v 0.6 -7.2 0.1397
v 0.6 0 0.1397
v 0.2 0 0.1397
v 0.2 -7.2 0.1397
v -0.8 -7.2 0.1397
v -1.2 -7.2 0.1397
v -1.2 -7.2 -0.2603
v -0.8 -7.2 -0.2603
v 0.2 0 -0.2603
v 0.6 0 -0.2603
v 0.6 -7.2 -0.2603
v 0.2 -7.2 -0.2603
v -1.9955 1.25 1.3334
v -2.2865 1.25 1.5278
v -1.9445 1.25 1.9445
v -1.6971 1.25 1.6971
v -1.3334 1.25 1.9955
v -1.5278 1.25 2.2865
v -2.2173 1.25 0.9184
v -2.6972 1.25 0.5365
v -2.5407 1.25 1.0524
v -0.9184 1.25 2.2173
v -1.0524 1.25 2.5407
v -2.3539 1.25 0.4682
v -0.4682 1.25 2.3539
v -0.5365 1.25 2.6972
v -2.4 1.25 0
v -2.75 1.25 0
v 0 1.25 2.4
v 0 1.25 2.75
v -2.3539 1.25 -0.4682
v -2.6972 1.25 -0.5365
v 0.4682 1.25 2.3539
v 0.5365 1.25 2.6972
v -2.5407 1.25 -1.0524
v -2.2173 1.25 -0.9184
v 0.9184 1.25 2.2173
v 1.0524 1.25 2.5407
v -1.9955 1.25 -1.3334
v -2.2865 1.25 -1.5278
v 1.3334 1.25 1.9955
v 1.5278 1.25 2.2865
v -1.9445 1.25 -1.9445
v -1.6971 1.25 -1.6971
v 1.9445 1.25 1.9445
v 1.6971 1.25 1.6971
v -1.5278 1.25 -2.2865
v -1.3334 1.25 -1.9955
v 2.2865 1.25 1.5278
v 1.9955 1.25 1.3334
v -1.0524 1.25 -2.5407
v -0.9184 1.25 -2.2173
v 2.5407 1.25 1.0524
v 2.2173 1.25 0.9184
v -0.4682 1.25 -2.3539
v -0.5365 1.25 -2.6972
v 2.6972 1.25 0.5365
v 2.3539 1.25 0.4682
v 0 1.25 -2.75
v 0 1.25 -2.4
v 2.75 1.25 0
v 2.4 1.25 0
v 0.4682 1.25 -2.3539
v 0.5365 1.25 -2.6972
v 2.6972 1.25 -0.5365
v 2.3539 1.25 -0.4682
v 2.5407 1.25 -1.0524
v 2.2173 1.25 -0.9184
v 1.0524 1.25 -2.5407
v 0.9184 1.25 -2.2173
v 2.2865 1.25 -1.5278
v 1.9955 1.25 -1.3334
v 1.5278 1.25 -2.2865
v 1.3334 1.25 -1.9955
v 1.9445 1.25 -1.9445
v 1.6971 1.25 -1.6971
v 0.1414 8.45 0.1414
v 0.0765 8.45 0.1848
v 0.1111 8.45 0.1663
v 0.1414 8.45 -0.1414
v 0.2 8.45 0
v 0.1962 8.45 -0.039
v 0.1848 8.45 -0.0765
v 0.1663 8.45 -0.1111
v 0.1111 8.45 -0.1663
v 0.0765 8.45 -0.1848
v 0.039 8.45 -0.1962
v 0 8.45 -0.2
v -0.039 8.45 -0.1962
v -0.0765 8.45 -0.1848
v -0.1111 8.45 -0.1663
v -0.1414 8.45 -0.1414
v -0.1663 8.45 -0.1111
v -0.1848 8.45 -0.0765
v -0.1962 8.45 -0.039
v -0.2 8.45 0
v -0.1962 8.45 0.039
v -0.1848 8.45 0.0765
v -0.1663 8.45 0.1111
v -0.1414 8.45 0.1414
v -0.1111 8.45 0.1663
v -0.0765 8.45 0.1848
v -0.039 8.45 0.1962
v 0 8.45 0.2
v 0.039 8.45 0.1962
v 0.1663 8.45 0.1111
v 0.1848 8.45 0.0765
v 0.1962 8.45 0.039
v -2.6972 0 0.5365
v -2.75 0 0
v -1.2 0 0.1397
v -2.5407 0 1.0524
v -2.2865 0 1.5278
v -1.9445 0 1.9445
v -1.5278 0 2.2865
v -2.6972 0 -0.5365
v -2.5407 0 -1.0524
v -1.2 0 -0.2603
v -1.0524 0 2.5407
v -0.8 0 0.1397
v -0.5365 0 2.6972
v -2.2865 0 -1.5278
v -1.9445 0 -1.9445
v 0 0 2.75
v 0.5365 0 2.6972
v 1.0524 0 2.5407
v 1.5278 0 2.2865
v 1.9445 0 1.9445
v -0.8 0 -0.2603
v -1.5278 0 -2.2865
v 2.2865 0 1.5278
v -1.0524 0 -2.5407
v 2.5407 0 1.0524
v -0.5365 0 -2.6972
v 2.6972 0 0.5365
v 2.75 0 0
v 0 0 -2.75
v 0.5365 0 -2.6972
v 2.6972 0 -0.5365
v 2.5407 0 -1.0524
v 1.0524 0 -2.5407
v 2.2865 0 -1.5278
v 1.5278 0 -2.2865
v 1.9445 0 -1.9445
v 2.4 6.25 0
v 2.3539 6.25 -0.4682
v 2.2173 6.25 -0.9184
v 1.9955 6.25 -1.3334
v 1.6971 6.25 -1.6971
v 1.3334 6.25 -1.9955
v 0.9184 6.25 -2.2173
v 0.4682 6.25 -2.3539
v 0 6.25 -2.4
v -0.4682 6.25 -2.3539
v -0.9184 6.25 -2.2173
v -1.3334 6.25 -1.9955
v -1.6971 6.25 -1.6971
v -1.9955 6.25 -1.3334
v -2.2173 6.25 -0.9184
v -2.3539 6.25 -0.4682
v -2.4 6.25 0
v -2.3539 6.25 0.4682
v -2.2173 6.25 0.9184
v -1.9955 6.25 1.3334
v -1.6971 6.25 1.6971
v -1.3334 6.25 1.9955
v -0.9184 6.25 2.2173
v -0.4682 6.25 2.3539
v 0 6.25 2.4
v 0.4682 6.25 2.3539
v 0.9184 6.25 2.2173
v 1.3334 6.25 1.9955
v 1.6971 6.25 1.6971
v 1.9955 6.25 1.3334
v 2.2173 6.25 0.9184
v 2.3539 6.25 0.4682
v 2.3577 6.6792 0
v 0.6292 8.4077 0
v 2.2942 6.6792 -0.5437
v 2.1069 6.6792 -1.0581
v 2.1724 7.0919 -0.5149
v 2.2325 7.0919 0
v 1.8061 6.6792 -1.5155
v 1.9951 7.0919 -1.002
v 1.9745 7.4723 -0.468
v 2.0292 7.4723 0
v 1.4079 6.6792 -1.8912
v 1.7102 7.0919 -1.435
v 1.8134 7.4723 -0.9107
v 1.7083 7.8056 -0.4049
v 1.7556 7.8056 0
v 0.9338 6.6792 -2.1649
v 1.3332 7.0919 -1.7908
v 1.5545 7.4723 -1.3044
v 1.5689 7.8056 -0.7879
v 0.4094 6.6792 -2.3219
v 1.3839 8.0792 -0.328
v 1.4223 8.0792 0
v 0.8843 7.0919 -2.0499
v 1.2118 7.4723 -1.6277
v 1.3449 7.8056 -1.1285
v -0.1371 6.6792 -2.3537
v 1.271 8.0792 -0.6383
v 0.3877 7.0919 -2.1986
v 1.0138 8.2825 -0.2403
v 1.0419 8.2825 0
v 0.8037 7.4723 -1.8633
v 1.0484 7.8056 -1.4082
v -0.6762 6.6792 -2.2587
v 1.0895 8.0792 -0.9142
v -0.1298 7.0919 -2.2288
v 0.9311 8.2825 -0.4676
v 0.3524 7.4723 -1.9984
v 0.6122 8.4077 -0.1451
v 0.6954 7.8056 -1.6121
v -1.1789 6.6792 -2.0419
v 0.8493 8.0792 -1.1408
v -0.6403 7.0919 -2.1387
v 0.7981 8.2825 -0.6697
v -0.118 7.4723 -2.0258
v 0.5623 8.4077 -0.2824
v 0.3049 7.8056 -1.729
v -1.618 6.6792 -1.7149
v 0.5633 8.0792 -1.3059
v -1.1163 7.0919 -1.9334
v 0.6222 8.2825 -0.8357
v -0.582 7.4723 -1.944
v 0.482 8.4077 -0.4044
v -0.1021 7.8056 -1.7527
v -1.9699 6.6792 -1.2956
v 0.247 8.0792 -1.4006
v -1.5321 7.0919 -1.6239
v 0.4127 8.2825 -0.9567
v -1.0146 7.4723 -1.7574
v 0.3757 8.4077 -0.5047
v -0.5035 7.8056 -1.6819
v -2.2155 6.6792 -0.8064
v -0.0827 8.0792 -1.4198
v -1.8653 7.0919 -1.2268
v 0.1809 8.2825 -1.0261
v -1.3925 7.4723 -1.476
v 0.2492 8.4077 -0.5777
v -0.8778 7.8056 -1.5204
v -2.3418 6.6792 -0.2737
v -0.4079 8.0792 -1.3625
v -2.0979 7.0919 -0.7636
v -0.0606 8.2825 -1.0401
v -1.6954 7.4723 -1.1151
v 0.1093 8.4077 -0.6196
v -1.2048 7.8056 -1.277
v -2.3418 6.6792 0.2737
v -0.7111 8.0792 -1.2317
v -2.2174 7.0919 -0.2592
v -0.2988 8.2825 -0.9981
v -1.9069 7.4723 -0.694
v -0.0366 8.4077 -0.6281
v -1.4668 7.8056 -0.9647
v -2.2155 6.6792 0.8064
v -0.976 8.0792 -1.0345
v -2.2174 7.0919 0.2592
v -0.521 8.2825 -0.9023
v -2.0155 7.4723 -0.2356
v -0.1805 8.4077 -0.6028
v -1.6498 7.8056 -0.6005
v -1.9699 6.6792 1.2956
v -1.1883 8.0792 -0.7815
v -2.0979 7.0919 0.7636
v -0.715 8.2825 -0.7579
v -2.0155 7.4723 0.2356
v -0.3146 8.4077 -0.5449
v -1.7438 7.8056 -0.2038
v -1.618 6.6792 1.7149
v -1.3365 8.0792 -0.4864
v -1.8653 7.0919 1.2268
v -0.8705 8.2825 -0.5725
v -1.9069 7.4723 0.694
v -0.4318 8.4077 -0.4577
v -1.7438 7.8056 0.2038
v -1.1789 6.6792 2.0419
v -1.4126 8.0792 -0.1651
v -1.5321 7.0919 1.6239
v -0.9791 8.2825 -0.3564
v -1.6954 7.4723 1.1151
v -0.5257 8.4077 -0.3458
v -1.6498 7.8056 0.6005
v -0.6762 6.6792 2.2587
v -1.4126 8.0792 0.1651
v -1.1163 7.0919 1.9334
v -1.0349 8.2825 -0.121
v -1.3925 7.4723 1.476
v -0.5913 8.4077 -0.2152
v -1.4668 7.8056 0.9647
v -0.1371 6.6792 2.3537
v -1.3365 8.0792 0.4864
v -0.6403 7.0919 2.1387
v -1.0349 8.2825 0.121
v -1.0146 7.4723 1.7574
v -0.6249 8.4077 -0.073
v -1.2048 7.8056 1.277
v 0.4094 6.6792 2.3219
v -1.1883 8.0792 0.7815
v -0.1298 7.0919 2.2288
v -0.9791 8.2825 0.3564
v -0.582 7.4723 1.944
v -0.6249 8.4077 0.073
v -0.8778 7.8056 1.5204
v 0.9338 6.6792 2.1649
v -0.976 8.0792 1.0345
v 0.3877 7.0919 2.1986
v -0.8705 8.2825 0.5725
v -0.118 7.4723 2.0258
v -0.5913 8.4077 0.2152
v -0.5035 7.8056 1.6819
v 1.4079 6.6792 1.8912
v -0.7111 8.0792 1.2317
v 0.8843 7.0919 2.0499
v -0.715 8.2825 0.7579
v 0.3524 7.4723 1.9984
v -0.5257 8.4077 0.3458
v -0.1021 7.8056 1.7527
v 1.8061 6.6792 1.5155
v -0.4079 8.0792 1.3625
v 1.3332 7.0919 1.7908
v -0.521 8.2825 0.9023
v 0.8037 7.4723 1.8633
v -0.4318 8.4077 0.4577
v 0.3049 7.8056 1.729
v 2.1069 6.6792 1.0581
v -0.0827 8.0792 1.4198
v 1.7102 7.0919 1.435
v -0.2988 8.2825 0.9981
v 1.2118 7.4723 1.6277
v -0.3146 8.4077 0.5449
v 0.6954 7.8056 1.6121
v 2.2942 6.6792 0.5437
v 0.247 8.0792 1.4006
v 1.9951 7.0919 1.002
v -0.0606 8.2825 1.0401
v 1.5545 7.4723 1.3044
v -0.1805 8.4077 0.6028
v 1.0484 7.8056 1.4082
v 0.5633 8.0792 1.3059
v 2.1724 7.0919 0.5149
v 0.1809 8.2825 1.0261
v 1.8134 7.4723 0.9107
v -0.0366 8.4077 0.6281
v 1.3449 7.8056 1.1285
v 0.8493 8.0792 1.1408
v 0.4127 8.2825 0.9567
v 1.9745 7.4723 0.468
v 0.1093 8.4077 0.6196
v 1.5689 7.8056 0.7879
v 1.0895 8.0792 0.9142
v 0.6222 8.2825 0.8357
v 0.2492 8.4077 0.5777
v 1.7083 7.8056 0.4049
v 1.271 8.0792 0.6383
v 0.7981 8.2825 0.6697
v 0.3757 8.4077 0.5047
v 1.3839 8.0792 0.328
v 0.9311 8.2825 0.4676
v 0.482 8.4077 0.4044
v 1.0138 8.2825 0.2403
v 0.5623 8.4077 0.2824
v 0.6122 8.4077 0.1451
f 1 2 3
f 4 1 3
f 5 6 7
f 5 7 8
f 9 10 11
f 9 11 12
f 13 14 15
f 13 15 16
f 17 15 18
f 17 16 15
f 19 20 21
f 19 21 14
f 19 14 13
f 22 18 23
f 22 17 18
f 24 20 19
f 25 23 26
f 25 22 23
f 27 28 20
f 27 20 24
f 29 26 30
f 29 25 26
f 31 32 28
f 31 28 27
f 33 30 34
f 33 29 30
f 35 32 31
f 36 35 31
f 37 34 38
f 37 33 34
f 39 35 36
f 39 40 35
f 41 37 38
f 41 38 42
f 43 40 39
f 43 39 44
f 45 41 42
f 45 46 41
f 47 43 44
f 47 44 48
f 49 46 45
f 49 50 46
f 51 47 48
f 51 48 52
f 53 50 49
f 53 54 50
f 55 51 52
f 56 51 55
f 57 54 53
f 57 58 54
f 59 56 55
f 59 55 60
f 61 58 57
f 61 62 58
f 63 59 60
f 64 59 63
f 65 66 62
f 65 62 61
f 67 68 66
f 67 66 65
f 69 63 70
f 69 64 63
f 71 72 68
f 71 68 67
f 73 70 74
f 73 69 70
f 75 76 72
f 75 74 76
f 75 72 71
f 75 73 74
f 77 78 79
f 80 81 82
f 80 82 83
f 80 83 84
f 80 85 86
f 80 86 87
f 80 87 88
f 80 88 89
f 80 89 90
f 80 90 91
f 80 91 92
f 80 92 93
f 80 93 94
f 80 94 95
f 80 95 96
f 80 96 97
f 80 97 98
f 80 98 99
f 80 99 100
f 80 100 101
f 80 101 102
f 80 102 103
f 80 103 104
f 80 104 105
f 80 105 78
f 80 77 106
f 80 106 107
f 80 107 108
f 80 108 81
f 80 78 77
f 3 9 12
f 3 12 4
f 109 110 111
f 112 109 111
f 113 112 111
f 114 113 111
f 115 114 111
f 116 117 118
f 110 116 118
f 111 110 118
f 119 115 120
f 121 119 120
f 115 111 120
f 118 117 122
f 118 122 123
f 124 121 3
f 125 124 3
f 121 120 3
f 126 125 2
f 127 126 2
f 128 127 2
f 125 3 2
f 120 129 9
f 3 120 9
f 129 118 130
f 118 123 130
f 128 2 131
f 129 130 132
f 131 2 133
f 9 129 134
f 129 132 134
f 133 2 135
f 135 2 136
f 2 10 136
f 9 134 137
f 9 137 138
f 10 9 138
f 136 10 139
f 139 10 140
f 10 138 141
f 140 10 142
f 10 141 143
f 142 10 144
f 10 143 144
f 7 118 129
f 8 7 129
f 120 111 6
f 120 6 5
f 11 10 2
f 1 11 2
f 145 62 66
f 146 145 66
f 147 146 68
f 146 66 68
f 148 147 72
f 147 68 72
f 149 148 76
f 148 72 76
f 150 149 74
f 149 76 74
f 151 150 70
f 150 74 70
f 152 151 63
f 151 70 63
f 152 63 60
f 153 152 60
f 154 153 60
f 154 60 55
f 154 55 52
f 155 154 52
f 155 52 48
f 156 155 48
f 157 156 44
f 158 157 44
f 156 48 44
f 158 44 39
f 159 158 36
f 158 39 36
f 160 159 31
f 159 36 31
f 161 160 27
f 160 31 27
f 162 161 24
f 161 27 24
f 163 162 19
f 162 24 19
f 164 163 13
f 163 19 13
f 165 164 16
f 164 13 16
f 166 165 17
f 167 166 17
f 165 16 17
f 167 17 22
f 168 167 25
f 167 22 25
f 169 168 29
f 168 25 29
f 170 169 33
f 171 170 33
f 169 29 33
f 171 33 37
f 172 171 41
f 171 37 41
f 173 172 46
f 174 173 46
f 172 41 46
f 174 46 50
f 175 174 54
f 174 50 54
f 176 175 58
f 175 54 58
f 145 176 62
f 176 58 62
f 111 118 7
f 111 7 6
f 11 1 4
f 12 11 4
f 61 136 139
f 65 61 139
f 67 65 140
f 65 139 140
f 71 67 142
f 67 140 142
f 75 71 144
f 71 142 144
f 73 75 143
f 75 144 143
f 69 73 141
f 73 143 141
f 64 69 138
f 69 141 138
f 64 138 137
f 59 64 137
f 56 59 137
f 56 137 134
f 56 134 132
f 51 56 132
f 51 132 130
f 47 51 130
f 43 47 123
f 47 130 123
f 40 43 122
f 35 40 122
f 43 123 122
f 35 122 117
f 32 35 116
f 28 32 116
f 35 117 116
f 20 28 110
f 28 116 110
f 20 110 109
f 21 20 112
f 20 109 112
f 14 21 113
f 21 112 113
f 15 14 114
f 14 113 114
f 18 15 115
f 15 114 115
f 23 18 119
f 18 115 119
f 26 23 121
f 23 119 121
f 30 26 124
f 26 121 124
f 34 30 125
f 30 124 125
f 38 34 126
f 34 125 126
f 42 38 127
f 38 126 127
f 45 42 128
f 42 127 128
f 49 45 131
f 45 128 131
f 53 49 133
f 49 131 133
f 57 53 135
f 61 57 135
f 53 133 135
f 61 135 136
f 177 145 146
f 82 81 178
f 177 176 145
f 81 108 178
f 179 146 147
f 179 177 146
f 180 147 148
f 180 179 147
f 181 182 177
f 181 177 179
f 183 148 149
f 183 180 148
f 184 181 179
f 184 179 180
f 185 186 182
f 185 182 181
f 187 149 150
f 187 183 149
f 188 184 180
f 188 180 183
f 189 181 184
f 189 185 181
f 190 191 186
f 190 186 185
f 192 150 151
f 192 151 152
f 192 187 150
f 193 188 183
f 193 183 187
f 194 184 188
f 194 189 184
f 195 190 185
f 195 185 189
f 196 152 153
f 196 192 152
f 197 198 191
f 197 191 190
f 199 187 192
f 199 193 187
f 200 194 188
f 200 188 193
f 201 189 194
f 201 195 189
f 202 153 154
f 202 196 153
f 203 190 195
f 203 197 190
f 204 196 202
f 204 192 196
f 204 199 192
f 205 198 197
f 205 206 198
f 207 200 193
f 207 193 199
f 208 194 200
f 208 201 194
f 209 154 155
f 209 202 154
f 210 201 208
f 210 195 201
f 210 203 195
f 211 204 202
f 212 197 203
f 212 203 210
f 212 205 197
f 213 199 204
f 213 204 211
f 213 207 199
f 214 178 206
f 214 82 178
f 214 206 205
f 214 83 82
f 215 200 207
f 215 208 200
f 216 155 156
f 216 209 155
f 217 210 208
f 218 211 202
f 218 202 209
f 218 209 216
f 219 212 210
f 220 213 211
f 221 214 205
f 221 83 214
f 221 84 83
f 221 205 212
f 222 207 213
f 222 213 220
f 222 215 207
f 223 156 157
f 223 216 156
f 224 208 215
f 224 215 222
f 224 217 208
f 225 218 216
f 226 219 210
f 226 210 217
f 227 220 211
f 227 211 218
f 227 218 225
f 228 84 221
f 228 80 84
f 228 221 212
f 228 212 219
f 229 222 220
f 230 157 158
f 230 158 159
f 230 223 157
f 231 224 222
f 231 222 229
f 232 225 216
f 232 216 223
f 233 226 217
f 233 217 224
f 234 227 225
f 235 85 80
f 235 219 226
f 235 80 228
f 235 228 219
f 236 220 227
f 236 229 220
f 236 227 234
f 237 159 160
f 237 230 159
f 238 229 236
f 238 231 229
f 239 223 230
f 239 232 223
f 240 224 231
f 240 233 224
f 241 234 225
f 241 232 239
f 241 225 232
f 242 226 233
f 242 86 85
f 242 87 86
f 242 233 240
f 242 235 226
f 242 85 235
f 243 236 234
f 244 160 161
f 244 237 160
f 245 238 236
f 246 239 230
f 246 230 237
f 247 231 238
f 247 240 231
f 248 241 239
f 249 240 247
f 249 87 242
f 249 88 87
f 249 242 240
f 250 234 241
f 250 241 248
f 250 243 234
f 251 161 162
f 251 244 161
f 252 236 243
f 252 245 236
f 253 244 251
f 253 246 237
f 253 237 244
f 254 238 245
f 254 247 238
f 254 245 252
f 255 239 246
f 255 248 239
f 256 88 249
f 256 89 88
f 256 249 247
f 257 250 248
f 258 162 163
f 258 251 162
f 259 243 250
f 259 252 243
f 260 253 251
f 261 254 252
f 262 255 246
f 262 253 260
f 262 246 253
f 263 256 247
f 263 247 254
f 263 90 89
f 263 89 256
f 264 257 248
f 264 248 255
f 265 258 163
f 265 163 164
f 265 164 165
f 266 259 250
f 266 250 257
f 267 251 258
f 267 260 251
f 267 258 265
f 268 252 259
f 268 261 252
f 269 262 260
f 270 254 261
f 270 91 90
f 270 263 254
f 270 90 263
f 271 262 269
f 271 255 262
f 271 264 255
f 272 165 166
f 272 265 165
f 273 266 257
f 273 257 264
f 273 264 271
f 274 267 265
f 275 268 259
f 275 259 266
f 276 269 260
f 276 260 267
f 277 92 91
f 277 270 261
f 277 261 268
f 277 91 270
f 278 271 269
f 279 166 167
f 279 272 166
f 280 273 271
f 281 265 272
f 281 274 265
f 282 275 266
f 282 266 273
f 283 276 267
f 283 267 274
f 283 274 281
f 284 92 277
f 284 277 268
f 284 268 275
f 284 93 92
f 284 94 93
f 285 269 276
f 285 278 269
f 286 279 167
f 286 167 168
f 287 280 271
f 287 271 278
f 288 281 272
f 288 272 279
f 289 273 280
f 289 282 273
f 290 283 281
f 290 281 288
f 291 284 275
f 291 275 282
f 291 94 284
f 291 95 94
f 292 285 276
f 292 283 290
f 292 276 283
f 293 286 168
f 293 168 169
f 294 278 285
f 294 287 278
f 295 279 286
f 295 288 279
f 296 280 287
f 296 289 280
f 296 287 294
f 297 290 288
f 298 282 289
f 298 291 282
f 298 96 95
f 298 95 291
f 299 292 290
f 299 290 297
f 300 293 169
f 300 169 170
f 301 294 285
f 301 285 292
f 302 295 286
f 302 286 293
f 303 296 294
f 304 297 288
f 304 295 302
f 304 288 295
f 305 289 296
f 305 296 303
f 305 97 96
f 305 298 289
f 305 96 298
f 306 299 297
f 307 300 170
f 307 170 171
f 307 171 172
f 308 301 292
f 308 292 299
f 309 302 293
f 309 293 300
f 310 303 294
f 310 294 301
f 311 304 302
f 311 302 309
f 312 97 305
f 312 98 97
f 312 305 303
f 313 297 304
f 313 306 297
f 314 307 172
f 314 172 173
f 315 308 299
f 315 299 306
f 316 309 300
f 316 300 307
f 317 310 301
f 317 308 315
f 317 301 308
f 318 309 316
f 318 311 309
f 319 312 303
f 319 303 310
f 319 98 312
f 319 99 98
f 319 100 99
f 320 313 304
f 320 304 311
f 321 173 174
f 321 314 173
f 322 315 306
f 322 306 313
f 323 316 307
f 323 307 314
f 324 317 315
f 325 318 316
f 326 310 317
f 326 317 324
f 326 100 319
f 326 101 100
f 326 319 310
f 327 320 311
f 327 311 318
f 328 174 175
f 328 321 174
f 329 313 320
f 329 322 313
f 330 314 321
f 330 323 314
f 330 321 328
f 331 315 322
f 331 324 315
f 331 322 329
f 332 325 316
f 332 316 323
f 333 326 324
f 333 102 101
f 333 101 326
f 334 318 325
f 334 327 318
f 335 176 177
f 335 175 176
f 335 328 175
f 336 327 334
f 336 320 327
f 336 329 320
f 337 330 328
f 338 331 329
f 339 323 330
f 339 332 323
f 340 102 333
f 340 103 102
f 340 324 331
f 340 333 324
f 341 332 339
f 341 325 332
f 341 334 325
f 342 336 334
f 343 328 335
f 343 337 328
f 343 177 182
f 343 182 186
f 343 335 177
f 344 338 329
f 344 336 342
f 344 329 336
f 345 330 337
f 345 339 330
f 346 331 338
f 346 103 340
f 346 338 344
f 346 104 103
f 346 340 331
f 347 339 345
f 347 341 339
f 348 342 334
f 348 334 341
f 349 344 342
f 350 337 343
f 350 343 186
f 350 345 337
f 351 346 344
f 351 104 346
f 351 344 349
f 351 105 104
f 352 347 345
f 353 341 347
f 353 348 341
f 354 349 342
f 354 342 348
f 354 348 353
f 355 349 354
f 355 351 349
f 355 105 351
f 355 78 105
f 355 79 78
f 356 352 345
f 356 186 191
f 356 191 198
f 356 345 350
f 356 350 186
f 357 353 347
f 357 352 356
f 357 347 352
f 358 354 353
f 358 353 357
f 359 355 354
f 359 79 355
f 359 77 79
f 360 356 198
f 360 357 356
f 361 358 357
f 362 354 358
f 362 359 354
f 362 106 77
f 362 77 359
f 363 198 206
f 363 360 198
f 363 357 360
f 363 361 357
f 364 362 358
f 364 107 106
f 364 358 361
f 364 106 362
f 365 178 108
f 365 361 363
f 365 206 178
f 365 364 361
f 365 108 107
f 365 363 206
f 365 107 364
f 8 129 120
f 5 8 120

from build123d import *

# Parameters (mm, degrees)
SKETCH1_R           = 2.75
BOSS_EXTRUDE1_DEPTH = 1.25
SKETCH2_R           = 2.4
BOSS_EXTRUDE2_DEPTH = 7.2
FILLET1_R           = 2.2
SKETCH3_W           = 0.4
SKETCH3_H           = 0.4
BOSS_EXTRUDE3_DEPTH = 7.2


with BuildPart() as part:
    # Sketch1 → Boss-Extrude1 (new body)
    with BuildSketch(Plane(origin=(0, 0, 0), x_dir=(1, 0, 0), z_dir=(0, 1, 0))):
        Circle(SKETCH1_R)
    extrude(amount=BOSS_EXTRUDE1_DEPTH)

    # Sketch2 → Boss-Extrude2 (add)
    with BuildSketch(Plane(origin=(0, 1.25, 0), x_dir=(1, 0, 0), z_dir=(0, 1, 0))):
        Circle(SKETCH2_R)
    extrude(amount=BOSS_EXTRUDE2_DEPTH)

    # Fillet1
    fillet1_edges = [part.edges().sort_by_distance(p)[0] for p in [
        (-2.4, 8.45, 0),
    ]]
    fillet(fillet1_edges, radius=FILLET1_R)

    # Sketch3 → Boss-Extrude3 (add)
    with BuildSketch(Plane.XZ):
        with Locations((-1, -0.060309903)):
            Rectangle(SKETCH3_W, SKETCH3_H)
    boss_extrude3 = extrude(amount=BOSS_EXTRUDE3_DEPTH)

    # Mirror2: Boss-Extrude3 across plane
    add(boss_extrude3.mirror(Plane(origin=(-0.3, 0, 0), x_dir=(0, 0, 1), z_dir=(1, 0, 0))))


solid = part.part
